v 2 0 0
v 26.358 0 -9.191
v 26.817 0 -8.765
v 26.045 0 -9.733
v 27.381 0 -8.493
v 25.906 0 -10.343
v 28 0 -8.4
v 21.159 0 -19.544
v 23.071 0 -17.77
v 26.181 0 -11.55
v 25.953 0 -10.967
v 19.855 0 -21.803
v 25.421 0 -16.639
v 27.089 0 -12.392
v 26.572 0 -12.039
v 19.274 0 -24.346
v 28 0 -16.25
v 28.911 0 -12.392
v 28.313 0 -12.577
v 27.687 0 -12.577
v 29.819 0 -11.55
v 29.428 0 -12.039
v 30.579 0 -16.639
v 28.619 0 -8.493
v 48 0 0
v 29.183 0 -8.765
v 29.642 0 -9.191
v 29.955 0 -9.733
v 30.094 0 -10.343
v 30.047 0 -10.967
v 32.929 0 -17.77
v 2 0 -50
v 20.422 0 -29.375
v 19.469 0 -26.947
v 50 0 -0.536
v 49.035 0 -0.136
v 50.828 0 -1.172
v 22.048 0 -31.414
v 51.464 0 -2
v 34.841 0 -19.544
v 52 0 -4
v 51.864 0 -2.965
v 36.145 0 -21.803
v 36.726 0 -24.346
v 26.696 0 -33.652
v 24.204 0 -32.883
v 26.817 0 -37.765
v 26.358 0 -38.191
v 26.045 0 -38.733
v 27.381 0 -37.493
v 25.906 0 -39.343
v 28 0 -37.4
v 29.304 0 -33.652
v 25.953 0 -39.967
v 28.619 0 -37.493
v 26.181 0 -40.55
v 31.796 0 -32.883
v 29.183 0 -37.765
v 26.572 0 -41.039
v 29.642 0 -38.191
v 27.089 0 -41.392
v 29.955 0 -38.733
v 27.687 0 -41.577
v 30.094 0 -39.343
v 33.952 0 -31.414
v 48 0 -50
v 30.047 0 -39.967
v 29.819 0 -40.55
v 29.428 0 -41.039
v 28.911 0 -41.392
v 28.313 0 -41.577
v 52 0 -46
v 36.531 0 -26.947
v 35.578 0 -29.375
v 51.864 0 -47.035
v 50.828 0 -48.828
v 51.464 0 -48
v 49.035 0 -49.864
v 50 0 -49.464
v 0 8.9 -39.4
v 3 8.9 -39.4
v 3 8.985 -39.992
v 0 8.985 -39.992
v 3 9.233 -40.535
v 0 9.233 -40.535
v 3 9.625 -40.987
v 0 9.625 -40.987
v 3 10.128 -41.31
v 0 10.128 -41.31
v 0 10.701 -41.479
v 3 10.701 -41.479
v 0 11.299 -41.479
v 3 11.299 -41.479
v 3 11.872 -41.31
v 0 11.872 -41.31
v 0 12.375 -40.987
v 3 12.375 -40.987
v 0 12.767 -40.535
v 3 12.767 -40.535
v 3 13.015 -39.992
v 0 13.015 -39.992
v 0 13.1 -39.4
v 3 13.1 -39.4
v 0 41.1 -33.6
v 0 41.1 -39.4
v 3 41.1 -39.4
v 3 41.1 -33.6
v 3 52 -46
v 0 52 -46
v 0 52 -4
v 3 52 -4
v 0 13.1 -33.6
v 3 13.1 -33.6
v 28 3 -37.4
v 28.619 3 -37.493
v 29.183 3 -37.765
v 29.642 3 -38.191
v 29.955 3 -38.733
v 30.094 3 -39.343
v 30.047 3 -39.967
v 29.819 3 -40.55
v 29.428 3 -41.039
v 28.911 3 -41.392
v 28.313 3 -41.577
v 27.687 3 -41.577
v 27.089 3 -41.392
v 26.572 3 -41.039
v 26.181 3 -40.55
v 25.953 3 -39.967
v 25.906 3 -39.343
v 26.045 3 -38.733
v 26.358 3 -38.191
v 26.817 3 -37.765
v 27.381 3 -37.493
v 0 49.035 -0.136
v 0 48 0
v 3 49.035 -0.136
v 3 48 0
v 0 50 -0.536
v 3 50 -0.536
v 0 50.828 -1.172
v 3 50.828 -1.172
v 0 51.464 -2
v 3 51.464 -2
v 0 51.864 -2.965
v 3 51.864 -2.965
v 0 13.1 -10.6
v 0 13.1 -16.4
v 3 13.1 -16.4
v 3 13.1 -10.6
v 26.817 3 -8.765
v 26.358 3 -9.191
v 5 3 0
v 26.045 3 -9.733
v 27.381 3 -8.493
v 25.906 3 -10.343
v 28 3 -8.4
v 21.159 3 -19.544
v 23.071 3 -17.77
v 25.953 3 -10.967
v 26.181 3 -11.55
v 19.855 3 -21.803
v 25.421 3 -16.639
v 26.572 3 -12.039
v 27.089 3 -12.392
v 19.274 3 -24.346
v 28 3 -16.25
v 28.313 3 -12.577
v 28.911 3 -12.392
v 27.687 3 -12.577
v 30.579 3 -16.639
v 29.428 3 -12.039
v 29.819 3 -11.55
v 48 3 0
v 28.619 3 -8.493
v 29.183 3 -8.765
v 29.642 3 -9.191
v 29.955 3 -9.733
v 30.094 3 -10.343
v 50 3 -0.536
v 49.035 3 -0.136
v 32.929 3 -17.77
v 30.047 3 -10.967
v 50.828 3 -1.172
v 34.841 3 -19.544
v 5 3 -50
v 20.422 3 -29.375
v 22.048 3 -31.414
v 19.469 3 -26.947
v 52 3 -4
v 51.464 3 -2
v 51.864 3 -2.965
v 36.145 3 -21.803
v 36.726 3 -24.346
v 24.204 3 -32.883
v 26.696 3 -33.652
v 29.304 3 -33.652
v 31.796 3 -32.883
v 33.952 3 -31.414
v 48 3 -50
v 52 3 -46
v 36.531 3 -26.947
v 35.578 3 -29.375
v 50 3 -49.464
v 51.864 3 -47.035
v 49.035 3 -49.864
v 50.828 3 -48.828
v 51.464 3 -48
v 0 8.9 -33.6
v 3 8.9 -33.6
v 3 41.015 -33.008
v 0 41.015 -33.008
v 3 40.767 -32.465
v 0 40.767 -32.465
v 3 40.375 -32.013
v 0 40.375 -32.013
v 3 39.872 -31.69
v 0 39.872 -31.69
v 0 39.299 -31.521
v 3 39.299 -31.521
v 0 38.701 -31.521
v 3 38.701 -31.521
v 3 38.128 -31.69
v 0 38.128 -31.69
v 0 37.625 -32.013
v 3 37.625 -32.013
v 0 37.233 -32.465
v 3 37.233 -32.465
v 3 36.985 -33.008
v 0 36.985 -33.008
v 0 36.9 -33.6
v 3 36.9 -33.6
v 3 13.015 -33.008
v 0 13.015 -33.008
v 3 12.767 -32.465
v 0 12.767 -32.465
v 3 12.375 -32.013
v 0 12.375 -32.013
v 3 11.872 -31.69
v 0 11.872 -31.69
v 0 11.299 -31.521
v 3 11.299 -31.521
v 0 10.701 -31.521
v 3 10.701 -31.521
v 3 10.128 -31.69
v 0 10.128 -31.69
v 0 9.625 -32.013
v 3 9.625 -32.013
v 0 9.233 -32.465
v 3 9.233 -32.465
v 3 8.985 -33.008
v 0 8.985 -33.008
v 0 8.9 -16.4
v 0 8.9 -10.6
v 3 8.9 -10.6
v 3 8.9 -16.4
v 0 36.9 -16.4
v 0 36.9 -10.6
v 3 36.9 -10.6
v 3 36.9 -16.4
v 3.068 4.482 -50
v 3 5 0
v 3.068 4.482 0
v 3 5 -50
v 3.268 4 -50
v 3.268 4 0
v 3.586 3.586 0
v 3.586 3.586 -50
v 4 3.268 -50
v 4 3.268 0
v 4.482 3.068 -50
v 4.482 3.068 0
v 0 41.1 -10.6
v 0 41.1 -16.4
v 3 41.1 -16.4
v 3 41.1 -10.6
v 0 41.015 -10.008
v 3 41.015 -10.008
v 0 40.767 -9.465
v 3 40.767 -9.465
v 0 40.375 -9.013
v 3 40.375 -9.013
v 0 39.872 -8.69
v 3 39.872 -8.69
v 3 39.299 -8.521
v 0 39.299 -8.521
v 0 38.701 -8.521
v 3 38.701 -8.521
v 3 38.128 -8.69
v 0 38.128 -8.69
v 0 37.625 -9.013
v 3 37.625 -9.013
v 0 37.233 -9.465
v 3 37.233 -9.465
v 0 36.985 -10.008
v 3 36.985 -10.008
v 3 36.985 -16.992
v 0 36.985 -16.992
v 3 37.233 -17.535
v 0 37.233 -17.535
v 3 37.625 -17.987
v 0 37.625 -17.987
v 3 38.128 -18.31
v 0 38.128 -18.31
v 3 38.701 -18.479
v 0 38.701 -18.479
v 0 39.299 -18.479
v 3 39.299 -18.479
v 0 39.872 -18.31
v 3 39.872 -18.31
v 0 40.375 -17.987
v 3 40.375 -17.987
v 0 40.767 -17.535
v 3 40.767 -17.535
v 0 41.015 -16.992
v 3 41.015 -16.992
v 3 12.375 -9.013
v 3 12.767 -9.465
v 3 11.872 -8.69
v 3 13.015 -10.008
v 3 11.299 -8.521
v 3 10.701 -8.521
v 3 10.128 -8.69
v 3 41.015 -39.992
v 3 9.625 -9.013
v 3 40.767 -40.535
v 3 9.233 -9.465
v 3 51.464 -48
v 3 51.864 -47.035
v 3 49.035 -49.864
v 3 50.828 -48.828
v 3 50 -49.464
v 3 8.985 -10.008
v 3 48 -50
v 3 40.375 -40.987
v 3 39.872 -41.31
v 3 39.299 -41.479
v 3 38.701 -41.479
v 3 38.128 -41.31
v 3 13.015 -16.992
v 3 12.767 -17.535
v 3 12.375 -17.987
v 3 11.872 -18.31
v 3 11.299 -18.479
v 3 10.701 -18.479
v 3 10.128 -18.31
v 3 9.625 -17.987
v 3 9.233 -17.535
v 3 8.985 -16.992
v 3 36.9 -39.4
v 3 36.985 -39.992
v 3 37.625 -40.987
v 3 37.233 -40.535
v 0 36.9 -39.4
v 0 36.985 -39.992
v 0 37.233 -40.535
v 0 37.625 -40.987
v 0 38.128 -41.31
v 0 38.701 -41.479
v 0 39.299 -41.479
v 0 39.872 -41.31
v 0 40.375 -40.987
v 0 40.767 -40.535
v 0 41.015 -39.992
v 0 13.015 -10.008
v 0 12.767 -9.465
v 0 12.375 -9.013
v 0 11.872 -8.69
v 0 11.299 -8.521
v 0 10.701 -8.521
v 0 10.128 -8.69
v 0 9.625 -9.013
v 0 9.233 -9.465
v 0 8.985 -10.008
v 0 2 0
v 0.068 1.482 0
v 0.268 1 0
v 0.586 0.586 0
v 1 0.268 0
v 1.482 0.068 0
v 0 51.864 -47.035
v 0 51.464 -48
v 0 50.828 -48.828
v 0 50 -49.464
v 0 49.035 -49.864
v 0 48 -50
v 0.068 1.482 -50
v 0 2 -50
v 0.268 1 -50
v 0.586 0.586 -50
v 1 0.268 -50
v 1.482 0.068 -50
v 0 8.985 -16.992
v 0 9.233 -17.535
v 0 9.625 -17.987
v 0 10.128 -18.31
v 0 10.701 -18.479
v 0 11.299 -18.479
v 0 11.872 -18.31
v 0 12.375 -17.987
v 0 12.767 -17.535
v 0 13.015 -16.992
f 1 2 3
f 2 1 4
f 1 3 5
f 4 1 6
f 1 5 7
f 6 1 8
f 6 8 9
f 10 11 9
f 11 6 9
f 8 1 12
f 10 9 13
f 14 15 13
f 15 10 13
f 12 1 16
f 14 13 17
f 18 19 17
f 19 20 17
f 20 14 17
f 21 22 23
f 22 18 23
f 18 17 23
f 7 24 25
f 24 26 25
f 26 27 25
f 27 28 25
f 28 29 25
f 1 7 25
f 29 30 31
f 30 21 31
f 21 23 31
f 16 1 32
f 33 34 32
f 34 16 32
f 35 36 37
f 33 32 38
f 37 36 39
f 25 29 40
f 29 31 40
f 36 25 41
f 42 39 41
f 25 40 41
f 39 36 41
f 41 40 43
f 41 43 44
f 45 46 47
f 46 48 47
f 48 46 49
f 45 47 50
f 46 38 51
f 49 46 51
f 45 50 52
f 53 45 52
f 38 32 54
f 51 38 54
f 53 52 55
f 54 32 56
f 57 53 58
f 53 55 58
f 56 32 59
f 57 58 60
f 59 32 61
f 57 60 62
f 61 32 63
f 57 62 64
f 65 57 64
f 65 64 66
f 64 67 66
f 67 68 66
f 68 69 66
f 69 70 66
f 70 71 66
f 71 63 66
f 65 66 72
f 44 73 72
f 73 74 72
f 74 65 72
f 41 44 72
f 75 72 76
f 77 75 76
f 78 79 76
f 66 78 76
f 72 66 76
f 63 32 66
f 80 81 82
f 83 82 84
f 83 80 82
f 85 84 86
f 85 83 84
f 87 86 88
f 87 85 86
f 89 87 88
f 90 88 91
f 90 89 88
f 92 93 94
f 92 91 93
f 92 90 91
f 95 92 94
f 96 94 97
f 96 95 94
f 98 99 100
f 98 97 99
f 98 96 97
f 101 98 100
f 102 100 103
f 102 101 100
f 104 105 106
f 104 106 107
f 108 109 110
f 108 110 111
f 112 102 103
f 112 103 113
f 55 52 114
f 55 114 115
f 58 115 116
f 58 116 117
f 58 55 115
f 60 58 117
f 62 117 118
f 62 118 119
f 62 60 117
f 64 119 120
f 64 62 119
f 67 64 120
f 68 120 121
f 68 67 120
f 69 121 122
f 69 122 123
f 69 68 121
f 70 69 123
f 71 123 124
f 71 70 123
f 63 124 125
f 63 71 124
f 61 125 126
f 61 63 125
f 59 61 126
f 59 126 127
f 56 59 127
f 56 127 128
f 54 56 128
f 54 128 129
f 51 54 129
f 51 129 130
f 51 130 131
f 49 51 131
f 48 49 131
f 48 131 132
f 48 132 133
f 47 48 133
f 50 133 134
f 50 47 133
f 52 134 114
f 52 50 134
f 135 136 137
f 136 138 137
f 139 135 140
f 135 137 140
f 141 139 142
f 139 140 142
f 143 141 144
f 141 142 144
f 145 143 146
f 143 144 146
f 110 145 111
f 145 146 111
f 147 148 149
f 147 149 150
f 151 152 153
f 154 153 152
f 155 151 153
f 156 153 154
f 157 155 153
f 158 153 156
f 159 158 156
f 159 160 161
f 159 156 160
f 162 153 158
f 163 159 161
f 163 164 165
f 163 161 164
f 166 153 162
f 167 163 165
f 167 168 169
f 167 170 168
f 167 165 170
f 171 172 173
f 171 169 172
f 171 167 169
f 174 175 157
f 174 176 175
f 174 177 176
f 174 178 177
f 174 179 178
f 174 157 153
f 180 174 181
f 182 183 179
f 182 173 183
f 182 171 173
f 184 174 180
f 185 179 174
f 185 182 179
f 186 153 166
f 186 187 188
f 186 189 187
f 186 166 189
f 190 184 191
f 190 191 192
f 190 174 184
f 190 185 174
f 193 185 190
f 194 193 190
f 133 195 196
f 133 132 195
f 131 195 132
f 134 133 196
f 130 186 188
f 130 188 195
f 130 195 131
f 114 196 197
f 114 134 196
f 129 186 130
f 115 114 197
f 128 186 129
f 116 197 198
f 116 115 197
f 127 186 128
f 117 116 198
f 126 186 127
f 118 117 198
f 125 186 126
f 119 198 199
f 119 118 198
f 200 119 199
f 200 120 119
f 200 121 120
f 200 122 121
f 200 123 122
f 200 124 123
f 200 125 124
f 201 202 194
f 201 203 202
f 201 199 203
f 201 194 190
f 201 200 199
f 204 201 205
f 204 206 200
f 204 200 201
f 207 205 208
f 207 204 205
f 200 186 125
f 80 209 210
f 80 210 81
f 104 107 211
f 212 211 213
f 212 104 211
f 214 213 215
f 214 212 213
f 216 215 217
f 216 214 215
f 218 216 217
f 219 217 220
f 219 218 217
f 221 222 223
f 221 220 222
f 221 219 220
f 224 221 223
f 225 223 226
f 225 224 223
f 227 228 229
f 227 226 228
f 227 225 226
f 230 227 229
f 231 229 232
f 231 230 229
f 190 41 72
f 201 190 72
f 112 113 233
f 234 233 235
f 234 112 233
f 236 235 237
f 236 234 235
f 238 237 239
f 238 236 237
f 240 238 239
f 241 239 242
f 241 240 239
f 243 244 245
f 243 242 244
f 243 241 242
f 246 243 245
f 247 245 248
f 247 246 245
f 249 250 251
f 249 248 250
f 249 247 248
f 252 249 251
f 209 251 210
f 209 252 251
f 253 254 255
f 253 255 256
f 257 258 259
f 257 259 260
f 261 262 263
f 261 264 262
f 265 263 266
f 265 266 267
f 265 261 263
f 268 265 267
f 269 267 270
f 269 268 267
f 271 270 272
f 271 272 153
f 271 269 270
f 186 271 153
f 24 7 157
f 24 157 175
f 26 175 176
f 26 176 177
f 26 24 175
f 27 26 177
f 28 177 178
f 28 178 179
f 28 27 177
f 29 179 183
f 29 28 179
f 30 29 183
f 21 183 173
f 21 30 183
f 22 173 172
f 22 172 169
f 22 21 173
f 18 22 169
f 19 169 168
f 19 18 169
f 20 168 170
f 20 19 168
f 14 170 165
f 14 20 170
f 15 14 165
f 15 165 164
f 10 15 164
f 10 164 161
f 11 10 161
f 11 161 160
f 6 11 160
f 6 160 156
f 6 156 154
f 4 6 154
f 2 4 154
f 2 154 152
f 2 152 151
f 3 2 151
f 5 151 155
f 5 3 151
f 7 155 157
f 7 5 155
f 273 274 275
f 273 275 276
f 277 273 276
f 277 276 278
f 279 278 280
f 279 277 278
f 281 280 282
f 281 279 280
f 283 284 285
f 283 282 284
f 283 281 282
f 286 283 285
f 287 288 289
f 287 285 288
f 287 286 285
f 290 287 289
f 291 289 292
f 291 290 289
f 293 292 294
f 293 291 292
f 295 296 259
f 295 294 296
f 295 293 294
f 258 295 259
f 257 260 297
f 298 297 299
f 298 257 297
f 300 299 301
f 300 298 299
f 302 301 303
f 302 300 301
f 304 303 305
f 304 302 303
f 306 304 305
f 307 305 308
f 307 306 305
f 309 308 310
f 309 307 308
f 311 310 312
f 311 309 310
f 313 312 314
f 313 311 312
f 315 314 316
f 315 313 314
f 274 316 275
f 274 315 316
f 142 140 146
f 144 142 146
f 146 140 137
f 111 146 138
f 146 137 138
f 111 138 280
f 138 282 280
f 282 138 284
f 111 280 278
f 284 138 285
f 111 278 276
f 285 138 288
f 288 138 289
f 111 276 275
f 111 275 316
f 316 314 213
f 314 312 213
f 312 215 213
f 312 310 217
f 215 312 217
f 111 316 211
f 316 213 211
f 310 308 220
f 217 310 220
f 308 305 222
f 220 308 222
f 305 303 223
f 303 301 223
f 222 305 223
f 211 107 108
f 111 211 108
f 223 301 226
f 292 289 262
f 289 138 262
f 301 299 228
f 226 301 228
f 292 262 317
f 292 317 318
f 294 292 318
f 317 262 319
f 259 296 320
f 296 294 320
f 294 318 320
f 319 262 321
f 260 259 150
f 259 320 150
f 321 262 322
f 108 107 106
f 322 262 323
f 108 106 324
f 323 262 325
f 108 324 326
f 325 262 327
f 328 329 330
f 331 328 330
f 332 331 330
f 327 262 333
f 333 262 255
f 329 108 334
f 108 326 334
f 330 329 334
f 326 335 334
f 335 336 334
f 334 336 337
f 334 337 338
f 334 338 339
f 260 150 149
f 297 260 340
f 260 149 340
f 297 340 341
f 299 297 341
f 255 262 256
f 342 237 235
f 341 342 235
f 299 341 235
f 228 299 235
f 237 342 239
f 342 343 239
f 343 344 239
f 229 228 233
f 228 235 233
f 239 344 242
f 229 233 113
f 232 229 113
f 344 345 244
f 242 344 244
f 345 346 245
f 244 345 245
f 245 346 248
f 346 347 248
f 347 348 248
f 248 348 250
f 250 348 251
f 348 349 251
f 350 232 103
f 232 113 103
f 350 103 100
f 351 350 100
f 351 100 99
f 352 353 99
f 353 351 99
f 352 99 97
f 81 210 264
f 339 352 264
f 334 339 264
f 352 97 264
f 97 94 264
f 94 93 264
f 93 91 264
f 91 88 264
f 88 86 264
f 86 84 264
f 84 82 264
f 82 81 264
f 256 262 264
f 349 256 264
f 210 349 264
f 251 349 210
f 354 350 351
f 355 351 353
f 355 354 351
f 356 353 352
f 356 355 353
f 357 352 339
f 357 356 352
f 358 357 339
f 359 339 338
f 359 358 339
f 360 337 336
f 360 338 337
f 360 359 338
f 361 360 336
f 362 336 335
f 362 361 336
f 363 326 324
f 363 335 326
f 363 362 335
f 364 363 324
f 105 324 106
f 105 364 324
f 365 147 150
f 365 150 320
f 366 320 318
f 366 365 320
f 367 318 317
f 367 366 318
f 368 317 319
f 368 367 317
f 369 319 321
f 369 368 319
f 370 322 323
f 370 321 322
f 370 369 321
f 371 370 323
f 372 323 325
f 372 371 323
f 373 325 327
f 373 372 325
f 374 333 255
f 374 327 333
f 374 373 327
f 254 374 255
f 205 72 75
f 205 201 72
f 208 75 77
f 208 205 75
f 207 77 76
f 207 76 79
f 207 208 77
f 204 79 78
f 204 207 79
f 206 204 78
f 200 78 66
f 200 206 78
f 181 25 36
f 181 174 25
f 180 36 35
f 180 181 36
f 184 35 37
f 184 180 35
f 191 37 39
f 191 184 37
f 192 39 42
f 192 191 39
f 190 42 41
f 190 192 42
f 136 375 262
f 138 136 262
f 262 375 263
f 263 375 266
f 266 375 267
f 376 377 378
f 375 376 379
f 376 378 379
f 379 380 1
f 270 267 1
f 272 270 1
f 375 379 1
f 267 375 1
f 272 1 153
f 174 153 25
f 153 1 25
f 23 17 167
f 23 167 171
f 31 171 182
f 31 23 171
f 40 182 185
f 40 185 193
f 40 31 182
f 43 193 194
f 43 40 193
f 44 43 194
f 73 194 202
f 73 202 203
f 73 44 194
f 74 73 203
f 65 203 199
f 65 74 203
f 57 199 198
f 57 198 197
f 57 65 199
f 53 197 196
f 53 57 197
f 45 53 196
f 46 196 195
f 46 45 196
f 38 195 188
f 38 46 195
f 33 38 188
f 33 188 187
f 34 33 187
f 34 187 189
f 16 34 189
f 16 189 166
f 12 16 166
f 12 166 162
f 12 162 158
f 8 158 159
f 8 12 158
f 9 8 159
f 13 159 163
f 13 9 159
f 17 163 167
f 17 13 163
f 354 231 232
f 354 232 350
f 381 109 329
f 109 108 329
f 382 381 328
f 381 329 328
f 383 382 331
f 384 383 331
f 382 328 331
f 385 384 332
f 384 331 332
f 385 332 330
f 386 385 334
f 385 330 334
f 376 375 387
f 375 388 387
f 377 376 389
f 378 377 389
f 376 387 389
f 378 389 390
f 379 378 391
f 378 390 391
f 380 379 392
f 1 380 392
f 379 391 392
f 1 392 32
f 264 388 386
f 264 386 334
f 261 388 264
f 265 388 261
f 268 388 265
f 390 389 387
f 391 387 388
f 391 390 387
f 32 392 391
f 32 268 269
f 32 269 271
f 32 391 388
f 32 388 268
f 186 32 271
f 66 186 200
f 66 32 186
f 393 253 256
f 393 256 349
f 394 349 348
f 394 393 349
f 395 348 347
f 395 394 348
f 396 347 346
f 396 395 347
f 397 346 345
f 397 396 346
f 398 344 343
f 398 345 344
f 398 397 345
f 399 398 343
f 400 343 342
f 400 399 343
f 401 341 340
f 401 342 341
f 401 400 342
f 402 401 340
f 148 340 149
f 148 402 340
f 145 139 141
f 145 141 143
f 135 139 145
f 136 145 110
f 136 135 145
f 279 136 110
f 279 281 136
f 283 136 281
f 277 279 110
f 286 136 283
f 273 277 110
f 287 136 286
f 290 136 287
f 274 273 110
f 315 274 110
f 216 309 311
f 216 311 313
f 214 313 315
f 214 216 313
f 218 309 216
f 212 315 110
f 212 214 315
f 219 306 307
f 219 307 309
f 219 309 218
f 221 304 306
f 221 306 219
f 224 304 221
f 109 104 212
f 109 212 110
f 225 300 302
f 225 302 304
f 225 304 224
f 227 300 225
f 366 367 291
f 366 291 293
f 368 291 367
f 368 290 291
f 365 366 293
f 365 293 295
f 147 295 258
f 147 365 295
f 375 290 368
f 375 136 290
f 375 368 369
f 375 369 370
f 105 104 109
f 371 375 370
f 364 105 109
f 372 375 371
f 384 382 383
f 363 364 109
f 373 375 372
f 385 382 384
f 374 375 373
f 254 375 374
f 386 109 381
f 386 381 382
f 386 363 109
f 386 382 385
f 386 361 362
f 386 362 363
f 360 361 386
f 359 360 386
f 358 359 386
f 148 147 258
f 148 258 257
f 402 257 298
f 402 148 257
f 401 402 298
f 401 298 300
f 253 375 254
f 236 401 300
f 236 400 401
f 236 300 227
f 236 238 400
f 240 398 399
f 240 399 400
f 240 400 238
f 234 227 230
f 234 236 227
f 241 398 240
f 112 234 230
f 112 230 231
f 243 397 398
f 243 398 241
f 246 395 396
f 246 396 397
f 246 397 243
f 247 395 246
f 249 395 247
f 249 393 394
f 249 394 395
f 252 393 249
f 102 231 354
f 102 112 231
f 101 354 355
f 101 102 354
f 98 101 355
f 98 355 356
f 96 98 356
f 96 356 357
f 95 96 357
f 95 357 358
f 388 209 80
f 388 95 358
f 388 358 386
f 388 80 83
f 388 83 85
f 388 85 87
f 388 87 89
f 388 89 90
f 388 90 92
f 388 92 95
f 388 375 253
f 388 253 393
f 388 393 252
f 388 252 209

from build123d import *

# Parameters (mm, degrees)
SKETCH_1_W          = 52
SKETCH_1_H          = 50
SKETCH_1_R          = 2.1
SKETCH_1_R_2        = 8.75
EXTRUDE_1_DEPTH     = 3
SKETCH_2_W          = 3
SKETCH_2_H          = 50
EXTRUDE_2_DEPTH     = 49
CUT_EXTRUDE_1_DEPTH = 4
FILLET_1_R          = 2
FILLET_2_R          = 2
FILLET_3_R          = 4
FILLET_4_R          = 4
FILLET_5_R          = 4
FILLET_6_R          = 4


with BuildPart() as part:
    # Эскиз1 → Бобышка-Вытянуть1 (new body)
    with BuildSketch(Plane(origin=(0, 0, 0), x_dir=(1, 0, 0), z_dir=(0, 1, 0))):
        with Locations((26, 25)):
            Rectangle(SKETCH_1_W, SKETCH_1_H)
        with Locations(Location((28, 39.5, 0), (0, 0, 270))):
            Circle(SKETCH_1_R, mode=Mode.SUBTRACT)
        with Locations(Location((28, 10.5, 0), (0, 0, 270))):
            Circle(SKETCH_1_R, mode=Mode.SUBTRACT)
        with Locations(Location((28, 25, 0), (0, 0, 270))):
            Circle(SKETCH_1_R_2, mode=Mode.SUBTRACT)
    extrude(amount=EXTRUDE_1_DEPTH)

    # Эскиз2 → Бобышка-Вытянуть2 (add)
    with BuildSketch(Plane(origin=(0, 3, 0), x_dir=(1, 0, 0), z_dir=(0, 1, 0))):
        with Locations((1.5, 25)):
            Rectangle(SKETCH_2_W, SKETCH_2_H)
    extrude(amount=EXTRUDE_2_DEPTH)

    # Эскиз3 → Вырез-Вытянуть1 (cut)
    with BuildSketch(Plane.ZY):
        with BuildLine():
            Line((-39.4, 13.1), (-33.6, 13.1))
            ThreePointArc((-33.6, 13.1), (-31.5, 11), (-33.6, 8.9))
            Line((-33.6, 8.9), (-39.4, 8.9))
            ThreePointArc((-39.4, 8.9), (-41.5, 11), (-39.4, 13.1))
        make_face()
        with BuildLine():
            Line((-16.4, 13.1), (-10.6, 13.1))
            ThreePointArc((-10.6, 13.1), (-8.5, 11), (-10.6, 8.9))
            Line((-10.6, 8.9), (-16.4, 8.9))
            ThreePointArc((-16.4, 8.9), (-18.5, 11), (-16.4, 13.1))
        make_face()
        with BuildLine():
            Line((-16.4, 41.1), (-10.6, 41.1))
            ThreePointArc((-10.6, 41.1), (-8.5, 39), (-10.6, 36.9))
            Line((-10.6, 36.9), (-16.4, 36.9))
            ThreePointArc((-16.4, 36.9), (-18.5, 39), (-16.4, 41.1))
        make_face()
        with BuildLine():
            Line((-39.4, 41.1), (-33.6, 41.1))
            ThreePointArc((-33.6, 41.1), (-31.5, 39), (-33.6, 36.9))
            Line((-33.6, 36.9), (-39.4, 36.9))
            ThreePointArc((-39.4, 36.9), (-41.5, 39), (-39.4, 41.1))
        make_face()
    extrude(amount=-CUT_EXTRUDE_1_DEPTH, mode=Mode.SUBTRACT)

    # Скругление1
    fillet_1_edges = [part.edges().sort_by_distance(p)[0] for p in [
        (3, 3, -25),
    ]]
    fillet(fillet_1_edges, radius=FILLET_1_R)

    # Скругление2
    fillet_2_edges = [part.edges().sort_by_distance(p)[0] for p in [
        (0, 0, -25),
    ]]
    fillet(fillet_2_edges, radius=FILLET_2_R)

    # Скругление3
    fillet_3_edges = [part.edges().sort_by_distance(p)[0] for p in [
        (1.5, 52, 0),
    ]]
    fillet(fillet_3_edges, radius=FILLET_3_R)

    # Скругление4
    fillet_4_edges = [part.edges().sort_by_distance(p)[0] for p in [
        (1.5, 52, -50),
    ]]
    fillet(fillet_4_edges, radius=FILLET_4_R)

    # Скругление5
    fillet_5_edges = [part.edges().sort_by_distance(p)[0] for p in [
        (52, 1.5, 0),
    ]]
    fillet(fillet_5_edges, radius=FILLET_5_R)

    # Скругление6
    fillet_6_edges = [part.edges().sort_by_distance(p)[0] for p in [
        (52, 1.5, -50),
    ]]
    fillet(fillet_6_edges, radius=FILLET_6_R)


solid = part.part
